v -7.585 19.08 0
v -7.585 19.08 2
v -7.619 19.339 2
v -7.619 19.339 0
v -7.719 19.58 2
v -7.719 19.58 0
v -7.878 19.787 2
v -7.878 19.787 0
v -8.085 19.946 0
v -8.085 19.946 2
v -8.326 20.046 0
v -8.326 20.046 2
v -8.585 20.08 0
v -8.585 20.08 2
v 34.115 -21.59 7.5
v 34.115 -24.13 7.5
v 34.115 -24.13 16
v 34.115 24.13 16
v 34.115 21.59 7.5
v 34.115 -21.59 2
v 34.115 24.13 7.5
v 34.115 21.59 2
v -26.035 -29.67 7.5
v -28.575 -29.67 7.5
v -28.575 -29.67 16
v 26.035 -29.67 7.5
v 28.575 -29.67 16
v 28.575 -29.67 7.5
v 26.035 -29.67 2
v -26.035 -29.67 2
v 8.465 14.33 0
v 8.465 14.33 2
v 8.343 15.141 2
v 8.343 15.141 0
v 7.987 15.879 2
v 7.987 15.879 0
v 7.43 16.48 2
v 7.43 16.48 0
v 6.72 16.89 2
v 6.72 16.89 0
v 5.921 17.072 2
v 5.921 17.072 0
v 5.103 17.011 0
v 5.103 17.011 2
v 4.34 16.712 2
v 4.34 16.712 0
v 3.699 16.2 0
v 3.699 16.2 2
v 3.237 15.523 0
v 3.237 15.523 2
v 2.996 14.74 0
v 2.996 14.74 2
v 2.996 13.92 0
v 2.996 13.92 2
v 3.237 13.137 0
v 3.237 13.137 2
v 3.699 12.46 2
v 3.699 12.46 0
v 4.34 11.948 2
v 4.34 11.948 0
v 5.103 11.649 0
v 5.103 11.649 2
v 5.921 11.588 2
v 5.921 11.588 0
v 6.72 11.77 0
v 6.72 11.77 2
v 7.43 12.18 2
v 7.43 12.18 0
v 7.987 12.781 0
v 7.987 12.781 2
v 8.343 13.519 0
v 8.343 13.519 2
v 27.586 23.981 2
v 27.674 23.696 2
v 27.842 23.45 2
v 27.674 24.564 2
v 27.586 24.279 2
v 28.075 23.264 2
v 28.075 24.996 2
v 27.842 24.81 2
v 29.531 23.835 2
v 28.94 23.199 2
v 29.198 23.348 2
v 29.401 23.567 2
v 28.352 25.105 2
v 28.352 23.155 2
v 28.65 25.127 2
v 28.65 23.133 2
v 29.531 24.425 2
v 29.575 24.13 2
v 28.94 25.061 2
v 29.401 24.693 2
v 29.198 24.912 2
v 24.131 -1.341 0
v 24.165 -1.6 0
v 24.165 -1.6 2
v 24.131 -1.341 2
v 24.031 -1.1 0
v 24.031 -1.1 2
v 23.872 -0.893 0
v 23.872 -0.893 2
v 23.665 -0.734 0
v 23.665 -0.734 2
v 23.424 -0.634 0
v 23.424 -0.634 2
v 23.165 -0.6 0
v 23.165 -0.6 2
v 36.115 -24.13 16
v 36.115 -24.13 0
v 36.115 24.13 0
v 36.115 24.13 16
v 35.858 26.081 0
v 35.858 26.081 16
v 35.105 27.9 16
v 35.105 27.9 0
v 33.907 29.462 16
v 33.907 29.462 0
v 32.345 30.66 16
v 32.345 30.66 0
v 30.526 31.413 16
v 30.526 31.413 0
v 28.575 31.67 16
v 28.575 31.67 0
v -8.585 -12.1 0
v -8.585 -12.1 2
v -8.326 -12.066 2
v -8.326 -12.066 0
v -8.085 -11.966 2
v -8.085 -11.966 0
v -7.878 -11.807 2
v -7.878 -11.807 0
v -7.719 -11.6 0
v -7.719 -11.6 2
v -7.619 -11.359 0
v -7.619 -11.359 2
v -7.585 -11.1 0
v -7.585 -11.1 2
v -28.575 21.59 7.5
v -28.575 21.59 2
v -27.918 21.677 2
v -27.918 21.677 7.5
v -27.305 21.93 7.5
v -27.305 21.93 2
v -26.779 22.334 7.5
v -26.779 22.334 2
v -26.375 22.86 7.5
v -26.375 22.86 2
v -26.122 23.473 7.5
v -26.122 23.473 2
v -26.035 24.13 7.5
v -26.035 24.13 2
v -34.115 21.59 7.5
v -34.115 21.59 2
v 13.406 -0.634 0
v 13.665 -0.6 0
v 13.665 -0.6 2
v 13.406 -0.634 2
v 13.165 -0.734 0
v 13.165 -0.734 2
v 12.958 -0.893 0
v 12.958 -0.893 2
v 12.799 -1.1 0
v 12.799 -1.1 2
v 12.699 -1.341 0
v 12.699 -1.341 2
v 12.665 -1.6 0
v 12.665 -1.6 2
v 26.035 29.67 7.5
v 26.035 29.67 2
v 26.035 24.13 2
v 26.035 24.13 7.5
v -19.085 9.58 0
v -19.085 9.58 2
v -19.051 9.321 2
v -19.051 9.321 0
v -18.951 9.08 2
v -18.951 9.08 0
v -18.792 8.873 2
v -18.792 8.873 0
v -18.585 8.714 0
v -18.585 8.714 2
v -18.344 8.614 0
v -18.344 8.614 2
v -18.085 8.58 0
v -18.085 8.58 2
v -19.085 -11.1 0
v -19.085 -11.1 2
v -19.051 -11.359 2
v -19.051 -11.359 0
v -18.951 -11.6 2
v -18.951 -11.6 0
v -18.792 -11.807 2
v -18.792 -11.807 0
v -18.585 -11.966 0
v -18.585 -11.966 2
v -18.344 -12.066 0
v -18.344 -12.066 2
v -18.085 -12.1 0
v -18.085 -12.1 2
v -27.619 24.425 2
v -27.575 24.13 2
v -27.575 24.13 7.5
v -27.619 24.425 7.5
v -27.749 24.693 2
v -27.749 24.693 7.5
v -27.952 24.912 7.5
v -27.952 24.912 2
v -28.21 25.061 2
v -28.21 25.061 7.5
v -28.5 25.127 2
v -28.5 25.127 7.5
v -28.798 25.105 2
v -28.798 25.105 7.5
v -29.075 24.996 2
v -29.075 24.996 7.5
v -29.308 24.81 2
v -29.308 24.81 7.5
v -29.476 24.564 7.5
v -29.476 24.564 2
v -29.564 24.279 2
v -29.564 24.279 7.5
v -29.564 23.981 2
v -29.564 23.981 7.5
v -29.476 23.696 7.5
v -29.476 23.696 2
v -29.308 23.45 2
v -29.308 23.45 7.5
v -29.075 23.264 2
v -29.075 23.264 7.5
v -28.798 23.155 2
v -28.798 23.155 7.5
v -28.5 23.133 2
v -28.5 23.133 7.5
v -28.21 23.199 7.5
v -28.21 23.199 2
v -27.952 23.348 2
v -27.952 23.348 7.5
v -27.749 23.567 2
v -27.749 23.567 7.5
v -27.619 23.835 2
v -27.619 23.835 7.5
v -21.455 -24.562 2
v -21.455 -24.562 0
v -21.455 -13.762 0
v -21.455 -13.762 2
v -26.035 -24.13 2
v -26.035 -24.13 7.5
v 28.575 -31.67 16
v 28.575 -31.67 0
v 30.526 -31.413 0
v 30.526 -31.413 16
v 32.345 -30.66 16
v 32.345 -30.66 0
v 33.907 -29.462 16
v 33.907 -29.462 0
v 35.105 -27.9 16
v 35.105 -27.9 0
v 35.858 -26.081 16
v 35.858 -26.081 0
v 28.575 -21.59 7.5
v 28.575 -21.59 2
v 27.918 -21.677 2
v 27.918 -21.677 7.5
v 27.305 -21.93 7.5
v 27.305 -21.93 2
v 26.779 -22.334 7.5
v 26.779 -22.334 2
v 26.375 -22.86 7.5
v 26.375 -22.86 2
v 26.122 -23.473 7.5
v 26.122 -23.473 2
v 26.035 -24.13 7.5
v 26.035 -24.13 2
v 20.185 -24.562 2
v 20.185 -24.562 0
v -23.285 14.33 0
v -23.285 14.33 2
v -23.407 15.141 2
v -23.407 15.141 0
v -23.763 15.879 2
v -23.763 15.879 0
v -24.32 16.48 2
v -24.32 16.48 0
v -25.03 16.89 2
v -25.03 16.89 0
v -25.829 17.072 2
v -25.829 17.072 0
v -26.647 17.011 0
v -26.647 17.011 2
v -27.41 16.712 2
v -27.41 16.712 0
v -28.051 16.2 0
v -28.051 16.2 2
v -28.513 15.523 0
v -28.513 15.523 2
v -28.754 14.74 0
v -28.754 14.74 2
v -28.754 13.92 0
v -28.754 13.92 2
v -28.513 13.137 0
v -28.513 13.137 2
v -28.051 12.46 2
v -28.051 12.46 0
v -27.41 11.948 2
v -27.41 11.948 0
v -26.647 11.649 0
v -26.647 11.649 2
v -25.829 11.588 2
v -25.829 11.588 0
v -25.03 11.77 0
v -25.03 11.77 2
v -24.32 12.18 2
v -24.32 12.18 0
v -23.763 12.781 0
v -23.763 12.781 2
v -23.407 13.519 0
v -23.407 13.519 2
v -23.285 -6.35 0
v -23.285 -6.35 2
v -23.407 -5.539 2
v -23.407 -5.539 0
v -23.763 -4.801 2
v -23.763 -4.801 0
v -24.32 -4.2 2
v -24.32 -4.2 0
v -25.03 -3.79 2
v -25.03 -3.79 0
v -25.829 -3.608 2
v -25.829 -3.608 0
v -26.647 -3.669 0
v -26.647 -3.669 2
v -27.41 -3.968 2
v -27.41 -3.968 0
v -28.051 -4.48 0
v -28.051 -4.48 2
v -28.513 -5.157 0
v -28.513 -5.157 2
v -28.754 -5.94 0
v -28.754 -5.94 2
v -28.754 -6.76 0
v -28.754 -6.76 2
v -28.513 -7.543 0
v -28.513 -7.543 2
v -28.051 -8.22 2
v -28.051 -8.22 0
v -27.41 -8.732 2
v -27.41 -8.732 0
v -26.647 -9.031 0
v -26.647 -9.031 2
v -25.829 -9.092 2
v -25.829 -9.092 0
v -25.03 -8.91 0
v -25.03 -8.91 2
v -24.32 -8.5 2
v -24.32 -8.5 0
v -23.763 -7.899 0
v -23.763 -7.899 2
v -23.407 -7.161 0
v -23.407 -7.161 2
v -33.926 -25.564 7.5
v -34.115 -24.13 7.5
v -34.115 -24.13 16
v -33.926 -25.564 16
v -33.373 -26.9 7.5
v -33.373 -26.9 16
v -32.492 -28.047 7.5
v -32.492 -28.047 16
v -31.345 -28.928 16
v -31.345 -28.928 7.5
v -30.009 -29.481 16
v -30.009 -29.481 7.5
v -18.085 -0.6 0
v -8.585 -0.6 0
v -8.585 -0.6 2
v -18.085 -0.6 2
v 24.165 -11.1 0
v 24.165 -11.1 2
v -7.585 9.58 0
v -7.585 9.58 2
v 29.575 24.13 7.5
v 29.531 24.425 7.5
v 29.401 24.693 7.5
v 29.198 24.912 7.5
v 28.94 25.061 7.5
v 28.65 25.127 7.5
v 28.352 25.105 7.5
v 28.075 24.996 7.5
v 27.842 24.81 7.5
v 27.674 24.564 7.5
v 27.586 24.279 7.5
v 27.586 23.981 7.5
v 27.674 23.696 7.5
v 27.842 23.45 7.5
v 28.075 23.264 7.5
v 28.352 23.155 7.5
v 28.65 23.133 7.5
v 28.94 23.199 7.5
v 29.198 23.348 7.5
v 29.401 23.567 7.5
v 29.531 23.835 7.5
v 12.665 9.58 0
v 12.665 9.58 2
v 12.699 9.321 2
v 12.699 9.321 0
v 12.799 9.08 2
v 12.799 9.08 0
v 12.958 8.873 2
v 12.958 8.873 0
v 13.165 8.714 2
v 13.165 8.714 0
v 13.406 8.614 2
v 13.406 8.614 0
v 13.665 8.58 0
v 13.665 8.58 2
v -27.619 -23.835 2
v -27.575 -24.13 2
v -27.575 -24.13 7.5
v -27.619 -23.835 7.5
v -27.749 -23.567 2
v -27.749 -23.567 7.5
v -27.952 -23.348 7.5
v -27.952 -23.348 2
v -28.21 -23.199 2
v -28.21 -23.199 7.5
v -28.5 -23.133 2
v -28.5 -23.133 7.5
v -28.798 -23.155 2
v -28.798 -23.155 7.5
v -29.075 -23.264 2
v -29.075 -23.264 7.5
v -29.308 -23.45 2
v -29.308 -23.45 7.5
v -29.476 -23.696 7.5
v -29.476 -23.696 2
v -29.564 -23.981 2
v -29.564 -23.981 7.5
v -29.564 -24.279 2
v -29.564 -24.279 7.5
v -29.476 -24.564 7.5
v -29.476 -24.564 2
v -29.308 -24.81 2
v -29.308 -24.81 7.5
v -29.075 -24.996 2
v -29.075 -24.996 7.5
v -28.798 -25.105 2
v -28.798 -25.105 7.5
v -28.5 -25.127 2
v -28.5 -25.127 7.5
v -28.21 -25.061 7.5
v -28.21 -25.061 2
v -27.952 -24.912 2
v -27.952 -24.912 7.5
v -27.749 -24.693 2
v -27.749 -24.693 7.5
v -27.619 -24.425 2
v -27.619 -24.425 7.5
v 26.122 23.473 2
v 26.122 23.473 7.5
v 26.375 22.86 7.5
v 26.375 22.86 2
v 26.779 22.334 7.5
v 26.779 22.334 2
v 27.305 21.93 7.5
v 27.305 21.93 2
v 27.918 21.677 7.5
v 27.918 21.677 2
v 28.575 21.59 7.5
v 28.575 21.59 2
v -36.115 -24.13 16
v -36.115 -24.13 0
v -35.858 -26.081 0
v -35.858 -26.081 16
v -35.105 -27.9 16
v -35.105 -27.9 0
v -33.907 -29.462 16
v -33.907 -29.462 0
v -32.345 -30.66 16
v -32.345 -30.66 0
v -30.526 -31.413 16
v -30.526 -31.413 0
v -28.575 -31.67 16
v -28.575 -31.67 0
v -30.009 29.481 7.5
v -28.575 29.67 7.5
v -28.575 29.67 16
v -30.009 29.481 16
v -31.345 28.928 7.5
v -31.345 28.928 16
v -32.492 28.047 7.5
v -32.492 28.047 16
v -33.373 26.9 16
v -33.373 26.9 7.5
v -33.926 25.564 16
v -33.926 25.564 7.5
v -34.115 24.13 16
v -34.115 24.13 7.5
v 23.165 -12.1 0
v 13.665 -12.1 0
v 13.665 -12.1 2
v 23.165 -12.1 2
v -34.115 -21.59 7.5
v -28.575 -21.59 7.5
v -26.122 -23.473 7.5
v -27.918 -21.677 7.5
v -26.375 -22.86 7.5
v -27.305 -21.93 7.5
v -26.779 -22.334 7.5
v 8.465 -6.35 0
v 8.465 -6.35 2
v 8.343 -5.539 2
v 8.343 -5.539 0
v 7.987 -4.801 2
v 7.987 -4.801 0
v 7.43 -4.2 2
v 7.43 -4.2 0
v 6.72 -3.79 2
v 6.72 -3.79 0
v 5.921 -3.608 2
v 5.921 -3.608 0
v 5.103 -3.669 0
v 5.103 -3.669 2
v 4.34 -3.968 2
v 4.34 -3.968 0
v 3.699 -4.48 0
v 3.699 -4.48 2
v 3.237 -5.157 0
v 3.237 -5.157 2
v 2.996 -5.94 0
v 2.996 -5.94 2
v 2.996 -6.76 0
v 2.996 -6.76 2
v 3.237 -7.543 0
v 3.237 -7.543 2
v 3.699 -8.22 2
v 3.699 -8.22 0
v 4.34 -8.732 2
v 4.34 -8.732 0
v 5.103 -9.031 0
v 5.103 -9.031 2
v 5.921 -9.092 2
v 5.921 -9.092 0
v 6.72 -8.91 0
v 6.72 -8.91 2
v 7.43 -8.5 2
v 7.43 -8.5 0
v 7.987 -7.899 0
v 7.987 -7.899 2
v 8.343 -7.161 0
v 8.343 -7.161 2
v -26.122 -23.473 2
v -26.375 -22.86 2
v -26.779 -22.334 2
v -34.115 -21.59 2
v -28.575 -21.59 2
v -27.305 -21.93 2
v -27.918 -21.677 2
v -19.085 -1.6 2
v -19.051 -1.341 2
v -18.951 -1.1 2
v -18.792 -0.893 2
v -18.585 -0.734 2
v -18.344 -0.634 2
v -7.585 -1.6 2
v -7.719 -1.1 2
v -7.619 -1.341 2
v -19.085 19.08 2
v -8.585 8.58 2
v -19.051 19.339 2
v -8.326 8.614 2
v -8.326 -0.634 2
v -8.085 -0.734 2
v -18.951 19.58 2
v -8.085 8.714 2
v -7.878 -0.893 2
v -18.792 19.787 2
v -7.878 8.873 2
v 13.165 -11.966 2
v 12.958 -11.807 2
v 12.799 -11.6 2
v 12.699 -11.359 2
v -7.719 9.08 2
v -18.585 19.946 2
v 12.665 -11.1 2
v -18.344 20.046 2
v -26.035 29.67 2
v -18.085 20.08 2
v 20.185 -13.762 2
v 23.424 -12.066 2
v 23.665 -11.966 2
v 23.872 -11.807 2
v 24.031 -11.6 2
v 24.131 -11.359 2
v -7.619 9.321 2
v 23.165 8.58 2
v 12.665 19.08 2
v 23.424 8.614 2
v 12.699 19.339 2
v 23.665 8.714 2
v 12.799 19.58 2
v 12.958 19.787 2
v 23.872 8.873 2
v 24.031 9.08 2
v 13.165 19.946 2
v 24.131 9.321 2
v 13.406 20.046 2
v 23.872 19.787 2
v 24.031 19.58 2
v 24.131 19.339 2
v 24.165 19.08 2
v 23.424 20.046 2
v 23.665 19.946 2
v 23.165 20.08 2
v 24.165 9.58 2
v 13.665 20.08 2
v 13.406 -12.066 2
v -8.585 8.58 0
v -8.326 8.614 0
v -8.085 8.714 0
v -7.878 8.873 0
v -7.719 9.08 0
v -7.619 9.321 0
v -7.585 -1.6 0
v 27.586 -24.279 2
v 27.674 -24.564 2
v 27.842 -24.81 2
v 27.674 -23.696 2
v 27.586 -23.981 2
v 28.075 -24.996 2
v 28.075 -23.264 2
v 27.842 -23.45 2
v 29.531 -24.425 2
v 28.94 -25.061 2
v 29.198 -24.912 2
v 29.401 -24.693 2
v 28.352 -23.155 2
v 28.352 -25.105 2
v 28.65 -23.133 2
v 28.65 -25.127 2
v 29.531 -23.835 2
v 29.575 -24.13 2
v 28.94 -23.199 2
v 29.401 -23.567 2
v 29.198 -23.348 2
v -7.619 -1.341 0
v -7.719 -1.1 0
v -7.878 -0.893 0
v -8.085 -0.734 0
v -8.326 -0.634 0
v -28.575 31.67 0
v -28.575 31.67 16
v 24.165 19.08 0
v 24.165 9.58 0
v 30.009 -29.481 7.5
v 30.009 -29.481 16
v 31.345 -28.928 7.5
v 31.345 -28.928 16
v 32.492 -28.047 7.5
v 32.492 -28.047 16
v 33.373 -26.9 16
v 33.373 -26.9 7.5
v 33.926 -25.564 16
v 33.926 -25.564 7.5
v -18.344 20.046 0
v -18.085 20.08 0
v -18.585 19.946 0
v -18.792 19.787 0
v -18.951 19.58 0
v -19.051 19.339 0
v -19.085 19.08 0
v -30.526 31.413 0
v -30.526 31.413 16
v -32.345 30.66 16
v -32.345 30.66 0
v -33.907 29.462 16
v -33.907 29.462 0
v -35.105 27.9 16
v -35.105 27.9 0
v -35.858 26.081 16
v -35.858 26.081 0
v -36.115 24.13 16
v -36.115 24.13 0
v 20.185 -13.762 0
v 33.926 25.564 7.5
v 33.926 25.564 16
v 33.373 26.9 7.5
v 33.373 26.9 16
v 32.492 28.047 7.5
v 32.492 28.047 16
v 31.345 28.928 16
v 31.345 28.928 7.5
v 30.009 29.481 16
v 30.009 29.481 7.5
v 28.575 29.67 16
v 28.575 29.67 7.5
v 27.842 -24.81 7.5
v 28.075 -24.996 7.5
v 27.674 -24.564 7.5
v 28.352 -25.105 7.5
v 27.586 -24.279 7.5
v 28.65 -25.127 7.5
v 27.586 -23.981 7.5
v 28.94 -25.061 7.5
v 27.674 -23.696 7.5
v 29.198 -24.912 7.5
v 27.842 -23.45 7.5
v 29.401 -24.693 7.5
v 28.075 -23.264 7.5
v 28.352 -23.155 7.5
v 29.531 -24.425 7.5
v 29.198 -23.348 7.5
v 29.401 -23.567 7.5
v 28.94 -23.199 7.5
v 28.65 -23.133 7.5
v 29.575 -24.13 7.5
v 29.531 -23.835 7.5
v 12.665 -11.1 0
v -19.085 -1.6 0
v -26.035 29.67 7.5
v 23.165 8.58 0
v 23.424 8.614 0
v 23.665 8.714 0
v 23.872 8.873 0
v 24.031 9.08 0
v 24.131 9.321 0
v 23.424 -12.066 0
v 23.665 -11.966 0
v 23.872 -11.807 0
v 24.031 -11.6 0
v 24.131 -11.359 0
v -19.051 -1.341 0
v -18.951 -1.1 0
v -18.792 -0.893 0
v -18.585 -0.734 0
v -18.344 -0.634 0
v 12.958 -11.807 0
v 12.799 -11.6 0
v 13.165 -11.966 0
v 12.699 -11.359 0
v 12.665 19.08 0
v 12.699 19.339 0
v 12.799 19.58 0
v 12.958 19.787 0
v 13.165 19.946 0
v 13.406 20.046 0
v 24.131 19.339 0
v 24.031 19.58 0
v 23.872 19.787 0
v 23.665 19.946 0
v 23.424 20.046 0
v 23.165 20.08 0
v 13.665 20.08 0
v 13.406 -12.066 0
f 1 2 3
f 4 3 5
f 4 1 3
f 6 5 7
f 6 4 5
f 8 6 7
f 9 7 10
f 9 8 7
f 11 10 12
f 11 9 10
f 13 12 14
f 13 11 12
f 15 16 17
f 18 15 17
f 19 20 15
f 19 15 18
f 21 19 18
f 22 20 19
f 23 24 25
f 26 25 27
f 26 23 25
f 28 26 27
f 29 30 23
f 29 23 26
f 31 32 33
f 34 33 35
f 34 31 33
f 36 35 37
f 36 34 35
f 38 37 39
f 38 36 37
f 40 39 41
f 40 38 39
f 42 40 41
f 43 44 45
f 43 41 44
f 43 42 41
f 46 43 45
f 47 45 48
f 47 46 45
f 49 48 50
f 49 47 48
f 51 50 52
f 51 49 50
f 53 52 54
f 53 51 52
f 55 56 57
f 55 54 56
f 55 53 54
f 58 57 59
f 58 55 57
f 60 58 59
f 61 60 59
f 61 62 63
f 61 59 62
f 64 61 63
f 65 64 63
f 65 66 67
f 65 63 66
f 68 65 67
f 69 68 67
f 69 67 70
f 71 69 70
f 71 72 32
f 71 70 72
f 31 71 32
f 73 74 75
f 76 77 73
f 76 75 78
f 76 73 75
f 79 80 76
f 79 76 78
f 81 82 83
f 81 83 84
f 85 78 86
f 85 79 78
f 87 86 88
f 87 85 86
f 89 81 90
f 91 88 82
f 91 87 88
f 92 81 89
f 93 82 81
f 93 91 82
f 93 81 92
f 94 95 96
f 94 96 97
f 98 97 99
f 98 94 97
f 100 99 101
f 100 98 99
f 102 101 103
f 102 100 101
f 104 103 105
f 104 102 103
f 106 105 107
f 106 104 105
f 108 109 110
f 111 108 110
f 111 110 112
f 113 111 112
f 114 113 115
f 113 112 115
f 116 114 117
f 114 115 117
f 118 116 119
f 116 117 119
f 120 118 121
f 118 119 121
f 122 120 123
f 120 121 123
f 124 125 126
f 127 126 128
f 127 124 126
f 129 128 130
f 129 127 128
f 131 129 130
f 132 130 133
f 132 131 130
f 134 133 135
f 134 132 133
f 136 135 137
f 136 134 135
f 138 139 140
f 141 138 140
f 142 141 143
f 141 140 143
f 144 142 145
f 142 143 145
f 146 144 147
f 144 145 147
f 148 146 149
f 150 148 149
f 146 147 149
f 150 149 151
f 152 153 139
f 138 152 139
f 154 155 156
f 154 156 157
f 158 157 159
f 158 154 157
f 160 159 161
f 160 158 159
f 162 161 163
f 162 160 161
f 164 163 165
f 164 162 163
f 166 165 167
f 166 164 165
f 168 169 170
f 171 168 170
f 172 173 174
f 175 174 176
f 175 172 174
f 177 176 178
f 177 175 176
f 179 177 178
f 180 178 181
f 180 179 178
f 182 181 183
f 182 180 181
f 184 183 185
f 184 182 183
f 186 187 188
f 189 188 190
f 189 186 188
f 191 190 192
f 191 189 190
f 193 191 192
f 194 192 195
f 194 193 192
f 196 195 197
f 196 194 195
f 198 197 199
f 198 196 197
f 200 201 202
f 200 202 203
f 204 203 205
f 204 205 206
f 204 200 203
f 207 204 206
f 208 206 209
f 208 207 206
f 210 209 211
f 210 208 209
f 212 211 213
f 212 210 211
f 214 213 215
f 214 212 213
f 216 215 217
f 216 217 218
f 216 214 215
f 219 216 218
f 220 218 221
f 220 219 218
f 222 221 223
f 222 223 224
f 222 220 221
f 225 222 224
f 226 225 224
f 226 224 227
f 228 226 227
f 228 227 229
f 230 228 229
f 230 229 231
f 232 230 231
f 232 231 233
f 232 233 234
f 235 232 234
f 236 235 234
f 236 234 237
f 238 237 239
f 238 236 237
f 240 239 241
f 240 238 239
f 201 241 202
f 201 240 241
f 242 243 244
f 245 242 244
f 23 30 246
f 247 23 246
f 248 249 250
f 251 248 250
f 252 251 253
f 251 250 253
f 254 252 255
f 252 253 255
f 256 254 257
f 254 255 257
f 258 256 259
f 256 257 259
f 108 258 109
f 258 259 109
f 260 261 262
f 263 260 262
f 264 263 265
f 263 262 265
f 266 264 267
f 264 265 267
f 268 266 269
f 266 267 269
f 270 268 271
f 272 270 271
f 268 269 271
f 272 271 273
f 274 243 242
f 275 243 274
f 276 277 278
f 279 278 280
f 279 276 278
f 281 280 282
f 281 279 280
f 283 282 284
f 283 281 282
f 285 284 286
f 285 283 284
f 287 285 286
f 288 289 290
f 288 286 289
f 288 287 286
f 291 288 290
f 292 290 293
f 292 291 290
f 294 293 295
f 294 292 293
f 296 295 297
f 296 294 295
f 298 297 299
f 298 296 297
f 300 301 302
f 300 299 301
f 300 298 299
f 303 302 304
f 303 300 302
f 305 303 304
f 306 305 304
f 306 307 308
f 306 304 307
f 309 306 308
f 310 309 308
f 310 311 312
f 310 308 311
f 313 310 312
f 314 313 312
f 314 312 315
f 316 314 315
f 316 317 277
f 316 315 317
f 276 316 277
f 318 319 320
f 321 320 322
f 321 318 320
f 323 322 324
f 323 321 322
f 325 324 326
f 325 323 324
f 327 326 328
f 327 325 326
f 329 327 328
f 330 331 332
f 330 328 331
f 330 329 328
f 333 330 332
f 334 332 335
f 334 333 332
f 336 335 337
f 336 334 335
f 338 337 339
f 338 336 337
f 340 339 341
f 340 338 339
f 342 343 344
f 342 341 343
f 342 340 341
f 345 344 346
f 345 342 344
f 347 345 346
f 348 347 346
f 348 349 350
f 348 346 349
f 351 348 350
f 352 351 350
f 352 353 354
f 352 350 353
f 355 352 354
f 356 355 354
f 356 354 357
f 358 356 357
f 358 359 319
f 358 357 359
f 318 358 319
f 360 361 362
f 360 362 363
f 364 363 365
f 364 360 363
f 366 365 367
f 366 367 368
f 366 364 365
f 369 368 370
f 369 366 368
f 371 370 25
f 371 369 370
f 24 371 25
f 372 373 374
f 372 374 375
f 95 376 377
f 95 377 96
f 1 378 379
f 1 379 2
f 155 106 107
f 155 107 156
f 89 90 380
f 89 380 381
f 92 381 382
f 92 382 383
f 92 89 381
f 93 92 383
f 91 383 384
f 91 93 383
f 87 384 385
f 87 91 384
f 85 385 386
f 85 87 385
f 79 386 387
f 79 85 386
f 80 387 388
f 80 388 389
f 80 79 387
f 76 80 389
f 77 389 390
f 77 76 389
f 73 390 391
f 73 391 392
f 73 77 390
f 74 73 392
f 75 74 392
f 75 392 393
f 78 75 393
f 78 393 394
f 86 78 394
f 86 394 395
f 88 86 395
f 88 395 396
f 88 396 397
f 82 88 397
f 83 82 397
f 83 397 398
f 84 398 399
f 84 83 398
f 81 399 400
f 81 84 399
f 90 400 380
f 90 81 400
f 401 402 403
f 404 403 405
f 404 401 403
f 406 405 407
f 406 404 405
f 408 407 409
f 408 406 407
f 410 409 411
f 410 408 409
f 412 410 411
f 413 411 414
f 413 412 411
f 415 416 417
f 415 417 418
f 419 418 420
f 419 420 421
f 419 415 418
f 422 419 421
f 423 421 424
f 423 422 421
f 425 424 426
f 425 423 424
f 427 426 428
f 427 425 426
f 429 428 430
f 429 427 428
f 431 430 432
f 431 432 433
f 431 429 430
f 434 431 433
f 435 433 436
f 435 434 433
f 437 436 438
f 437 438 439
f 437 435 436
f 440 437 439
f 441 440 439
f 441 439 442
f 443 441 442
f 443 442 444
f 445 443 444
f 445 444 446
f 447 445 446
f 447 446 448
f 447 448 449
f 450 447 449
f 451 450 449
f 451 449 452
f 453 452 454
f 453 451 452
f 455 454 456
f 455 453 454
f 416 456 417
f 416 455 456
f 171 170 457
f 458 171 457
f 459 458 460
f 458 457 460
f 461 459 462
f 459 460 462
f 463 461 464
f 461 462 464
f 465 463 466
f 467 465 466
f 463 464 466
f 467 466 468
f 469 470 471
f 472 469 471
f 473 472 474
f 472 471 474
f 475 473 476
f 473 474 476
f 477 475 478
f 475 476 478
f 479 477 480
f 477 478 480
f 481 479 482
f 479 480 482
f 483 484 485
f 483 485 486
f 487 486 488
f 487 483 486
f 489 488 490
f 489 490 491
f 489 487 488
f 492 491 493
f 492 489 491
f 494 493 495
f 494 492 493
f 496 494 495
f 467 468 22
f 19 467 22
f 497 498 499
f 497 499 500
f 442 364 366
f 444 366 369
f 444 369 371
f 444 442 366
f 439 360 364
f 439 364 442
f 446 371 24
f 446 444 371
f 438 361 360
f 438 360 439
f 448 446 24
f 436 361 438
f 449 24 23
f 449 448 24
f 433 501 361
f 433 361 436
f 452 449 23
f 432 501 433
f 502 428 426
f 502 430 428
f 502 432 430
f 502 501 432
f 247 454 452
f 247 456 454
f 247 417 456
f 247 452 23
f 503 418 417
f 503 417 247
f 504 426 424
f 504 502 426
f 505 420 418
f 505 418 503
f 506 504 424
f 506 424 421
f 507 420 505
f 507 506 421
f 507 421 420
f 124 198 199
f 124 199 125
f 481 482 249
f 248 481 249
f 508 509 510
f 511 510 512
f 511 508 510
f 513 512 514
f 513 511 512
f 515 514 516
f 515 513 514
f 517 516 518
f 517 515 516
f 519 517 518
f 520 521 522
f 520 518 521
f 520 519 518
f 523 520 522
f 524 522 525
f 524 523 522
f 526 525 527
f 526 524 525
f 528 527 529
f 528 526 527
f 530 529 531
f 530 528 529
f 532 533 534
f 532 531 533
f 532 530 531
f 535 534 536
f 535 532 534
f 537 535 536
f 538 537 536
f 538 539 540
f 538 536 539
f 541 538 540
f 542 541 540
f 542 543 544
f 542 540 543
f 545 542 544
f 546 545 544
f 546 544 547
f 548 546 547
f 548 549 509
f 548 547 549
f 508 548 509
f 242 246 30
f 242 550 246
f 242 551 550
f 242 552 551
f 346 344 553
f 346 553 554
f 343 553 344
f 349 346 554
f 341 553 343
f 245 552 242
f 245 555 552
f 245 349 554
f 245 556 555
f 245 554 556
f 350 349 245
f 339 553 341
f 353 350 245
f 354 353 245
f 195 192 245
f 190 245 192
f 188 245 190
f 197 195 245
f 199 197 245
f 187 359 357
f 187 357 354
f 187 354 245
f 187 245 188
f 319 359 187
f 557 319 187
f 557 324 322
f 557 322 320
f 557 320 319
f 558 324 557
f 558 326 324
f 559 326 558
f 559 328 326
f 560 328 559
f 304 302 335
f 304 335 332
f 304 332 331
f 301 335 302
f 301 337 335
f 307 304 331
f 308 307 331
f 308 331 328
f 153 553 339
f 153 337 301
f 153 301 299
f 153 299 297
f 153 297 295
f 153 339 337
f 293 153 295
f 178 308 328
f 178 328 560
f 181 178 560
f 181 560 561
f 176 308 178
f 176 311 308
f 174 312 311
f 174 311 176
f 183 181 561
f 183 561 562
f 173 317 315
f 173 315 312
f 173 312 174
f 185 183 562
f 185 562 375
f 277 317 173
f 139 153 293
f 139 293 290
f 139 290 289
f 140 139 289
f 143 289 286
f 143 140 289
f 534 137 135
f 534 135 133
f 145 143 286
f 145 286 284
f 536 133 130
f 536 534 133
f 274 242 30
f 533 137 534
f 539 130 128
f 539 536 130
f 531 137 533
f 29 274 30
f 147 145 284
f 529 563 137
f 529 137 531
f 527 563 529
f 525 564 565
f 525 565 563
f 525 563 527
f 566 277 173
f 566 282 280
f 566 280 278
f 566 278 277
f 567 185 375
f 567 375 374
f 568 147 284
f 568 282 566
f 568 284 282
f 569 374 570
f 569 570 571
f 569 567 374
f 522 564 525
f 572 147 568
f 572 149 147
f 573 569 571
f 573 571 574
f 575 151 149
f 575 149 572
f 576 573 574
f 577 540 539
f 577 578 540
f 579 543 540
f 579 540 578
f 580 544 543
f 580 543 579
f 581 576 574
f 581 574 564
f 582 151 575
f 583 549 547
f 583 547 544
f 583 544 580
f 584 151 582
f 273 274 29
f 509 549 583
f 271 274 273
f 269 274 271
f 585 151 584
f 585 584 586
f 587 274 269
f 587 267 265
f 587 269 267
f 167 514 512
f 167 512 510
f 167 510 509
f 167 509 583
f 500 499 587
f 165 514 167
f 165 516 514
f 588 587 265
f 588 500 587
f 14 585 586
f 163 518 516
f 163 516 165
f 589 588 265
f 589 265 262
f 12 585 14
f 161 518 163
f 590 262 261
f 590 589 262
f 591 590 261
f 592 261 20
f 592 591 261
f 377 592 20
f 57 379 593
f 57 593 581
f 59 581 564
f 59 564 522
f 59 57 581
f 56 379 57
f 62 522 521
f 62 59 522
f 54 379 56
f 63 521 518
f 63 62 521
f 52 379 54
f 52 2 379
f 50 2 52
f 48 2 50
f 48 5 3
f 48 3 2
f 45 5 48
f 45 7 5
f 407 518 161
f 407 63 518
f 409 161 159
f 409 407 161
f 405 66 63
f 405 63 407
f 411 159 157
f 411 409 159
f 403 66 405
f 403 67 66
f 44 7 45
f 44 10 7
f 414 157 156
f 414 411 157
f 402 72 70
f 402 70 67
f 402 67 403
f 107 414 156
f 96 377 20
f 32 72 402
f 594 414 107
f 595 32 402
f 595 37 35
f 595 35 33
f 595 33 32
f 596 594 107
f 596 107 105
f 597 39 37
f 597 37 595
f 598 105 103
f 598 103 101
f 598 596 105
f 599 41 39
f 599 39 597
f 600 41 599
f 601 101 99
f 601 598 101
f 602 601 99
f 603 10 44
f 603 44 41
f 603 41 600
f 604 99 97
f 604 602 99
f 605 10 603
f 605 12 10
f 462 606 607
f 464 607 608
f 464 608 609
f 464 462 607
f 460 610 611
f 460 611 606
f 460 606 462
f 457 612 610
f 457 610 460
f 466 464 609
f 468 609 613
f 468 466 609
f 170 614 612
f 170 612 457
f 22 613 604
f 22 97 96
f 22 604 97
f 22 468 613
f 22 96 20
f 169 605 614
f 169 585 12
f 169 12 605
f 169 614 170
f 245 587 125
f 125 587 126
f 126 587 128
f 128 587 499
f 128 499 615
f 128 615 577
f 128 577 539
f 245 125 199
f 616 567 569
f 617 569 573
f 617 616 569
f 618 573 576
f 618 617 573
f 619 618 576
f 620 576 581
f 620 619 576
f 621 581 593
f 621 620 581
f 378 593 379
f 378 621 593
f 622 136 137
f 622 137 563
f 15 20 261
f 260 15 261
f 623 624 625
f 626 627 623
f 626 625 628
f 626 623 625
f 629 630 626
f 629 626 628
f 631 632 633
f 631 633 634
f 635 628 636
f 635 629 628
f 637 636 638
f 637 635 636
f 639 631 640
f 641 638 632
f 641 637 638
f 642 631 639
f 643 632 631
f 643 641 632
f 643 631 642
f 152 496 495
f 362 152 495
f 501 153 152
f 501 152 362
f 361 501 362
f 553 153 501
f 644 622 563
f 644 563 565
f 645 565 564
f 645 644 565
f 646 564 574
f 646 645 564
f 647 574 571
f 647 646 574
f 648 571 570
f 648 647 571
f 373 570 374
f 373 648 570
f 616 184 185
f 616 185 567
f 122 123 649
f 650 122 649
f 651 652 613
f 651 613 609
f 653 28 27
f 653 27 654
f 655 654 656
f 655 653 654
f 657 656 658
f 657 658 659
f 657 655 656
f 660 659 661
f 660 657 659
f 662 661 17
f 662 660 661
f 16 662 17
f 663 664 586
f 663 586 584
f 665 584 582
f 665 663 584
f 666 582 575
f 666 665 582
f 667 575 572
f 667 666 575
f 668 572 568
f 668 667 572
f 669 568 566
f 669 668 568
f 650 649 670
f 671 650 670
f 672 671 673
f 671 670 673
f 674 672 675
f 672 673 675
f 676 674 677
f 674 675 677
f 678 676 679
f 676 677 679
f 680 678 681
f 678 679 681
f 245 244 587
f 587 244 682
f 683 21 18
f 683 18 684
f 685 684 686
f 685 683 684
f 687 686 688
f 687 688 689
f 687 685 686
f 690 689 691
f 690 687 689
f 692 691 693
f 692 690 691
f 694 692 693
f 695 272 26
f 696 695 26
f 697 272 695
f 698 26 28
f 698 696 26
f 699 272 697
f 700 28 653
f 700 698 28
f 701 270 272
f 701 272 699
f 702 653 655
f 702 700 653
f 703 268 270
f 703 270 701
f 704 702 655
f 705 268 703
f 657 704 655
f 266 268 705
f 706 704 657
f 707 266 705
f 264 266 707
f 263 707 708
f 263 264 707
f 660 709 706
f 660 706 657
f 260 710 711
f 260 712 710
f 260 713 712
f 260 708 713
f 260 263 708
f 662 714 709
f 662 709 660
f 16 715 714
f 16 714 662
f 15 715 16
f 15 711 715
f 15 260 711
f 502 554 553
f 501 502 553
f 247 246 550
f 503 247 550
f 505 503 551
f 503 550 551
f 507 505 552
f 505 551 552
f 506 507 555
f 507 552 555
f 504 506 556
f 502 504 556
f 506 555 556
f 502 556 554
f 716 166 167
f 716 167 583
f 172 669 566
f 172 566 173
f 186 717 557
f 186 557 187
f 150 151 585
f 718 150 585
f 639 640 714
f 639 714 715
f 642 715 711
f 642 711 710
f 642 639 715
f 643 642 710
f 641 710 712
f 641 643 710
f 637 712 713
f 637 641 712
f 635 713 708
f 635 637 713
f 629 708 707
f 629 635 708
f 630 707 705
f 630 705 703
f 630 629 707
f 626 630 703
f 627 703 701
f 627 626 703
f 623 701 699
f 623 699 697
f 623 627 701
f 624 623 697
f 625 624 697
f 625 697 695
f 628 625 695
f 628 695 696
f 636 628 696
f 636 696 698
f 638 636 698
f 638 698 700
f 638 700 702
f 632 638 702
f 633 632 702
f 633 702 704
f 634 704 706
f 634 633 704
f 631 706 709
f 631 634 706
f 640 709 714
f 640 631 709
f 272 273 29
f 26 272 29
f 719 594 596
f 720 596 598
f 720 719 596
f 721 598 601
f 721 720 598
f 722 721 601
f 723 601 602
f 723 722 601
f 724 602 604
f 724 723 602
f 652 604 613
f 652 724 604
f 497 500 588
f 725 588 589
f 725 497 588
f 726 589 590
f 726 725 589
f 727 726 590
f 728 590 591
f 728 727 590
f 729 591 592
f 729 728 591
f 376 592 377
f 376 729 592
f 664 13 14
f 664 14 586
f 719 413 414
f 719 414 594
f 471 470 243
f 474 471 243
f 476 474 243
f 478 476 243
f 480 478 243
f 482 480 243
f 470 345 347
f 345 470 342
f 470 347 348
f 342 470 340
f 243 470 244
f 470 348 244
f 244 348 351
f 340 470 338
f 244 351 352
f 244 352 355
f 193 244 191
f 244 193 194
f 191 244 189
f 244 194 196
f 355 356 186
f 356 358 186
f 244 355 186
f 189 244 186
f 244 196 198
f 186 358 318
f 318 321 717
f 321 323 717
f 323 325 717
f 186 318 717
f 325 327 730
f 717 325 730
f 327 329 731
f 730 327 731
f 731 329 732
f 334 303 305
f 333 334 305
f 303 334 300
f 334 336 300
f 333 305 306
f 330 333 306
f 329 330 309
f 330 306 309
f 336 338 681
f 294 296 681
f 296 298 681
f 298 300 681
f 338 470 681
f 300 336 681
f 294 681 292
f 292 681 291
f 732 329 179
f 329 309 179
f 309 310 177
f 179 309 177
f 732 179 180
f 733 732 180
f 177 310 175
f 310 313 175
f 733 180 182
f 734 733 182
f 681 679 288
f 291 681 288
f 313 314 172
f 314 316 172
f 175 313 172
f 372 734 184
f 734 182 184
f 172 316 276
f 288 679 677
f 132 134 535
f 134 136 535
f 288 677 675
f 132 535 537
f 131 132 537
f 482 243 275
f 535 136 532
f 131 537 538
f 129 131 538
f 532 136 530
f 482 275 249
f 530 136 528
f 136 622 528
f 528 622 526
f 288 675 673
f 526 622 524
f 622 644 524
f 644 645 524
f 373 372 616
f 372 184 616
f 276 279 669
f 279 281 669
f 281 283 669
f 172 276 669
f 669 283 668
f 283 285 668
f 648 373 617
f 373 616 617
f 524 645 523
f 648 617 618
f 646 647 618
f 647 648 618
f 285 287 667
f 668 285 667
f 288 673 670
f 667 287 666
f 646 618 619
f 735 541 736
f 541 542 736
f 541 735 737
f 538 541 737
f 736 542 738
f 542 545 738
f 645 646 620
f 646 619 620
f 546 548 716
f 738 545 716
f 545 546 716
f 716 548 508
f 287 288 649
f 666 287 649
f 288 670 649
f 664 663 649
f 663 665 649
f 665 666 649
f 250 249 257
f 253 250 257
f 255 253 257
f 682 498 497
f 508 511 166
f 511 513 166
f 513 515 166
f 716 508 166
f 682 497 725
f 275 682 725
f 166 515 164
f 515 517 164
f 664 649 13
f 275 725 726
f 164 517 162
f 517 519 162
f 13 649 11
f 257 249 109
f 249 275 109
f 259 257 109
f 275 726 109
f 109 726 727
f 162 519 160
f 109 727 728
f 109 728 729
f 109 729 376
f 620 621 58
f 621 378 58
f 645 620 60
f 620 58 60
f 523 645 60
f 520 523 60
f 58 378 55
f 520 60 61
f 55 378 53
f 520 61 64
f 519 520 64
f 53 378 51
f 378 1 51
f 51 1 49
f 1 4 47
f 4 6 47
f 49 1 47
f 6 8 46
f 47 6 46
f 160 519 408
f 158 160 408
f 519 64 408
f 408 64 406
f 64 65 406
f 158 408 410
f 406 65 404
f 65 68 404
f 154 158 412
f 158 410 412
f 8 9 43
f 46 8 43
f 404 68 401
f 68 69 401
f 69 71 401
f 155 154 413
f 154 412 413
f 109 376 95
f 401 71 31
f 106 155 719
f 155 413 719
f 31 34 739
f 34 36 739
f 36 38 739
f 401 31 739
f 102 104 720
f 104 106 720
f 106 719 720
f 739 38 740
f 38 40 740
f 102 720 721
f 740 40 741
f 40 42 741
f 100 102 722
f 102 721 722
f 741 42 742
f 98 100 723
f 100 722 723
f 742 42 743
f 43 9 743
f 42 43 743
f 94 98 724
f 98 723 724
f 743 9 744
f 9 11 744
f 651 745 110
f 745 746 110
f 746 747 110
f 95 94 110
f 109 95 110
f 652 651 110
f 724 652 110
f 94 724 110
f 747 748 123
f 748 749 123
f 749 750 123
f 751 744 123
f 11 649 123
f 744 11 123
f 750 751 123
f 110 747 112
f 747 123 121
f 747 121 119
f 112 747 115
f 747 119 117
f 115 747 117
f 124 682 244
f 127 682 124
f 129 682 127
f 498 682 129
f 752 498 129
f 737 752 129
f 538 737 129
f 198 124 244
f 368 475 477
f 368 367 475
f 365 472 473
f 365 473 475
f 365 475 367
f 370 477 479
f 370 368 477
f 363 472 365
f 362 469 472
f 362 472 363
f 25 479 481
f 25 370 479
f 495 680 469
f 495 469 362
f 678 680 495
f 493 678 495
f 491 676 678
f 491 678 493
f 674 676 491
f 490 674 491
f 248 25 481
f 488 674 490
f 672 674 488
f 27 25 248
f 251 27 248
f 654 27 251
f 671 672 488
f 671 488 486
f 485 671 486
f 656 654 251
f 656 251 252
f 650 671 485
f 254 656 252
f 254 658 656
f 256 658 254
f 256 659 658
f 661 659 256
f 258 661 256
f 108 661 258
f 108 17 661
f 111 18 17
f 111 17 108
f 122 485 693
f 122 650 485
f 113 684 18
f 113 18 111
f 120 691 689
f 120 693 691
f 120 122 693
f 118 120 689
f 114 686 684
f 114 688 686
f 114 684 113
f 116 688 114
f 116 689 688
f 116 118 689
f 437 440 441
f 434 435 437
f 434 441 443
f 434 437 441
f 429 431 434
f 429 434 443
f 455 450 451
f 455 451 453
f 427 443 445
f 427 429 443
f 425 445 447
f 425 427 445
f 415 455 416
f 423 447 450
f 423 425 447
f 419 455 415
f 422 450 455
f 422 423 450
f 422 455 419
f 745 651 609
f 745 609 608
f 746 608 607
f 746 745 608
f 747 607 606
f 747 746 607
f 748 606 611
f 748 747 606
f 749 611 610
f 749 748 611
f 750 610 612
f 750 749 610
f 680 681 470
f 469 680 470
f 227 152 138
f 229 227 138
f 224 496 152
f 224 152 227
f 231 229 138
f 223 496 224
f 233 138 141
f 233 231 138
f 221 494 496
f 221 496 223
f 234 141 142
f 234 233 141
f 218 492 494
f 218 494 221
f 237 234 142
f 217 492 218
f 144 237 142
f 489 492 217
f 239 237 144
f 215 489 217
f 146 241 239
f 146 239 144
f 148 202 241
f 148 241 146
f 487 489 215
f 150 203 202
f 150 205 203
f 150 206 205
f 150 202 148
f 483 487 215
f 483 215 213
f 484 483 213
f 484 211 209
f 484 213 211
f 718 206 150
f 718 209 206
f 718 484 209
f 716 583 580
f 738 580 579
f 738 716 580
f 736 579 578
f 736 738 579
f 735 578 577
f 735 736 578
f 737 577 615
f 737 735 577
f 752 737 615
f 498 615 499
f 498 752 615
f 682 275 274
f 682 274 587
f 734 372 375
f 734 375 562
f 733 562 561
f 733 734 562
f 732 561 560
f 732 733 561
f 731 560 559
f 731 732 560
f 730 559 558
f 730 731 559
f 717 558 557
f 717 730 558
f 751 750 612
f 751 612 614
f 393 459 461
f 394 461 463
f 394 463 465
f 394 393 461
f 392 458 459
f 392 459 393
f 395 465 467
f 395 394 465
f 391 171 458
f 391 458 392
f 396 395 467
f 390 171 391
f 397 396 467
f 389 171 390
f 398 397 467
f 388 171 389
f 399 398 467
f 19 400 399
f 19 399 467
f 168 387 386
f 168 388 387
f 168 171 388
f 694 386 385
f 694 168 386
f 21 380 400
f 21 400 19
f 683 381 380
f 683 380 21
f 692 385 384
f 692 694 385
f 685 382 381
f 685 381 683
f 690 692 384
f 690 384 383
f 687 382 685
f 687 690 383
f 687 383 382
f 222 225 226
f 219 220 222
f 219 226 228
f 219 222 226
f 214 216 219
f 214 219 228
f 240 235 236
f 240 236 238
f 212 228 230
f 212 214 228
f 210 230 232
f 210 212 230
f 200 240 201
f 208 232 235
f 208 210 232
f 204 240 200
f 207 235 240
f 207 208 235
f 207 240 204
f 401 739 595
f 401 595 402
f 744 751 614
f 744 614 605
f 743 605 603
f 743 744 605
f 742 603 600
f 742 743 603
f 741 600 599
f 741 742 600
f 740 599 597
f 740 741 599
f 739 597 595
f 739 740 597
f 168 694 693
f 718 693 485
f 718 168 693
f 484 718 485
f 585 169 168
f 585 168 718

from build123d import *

# Parameters (mm, degrees)
F1_DEPTH = 16
F2_T     = -2
F3_W     = 41.64
F3_H     = 10.8
F3_R     = 2.75
F4_DEPTH = 16.001
F5_R     = 1
F6_DEPTH = 5.5


with BuildPart() as f1:
    # F0 (on Top) → F1 (new body)
    with BuildSketch(Plane.XY):
        with BuildLine():
            ThreePointArc((36.115, 24.13), (33.906585, 29.461585), (28.575, 31.67))
            Line((28.575, 31.67), (-28.575, 31.67))
            ThreePointArc((-28.575, 31.67), (-33.906585, 29.461585), (-36.115, 24.13))
            Line((-36.115, 24.13), (-36.115, -24.13))
            ThreePointArc((-36.115, -24.13), (-33.906585, -29.461585), (-28.575, -31.67))
            Line((-28.575, -31.67), (28.575, -31.67))
            ThreePointArc((28.575, -31.67), (33.906585, -29.461585), (36.115, -24.13))
            Line((36.115, -24.13), (36.115, 24.13))
        make_face()
    extrude(amount=F1_DEPTH)

    # F2
    f2_openings = [f1.faces().sort_by_distance(p)[0] for p in [
        (0, 0, 16),
    ]]
    offset(amount=F2_T, openings=f2_openings)

    # F3 (on Top) → F4 (cut, through all)
    with BuildSketch(Plane.XY):
        with Locations((-0.635, -19.162)):
            Rectangle(F3_W, F3_H)
        with BuildLine():
            Line((-8.585, -0.6), (-18.085, -0.6))
            ThreePointArc((-18.085, -0.6), (-18.792107, -0.892893), (-19.085, -1.6))
            Line((-19.085, -1.6), (-19.085, -11.1))
            ThreePointArc((-19.085, -11.1), (-18.792107, -11.807107), (-18.085, -12.1))
            Line((-18.085, -12.1), (-8.585, -12.1))
            ThreePointArc((-8.585, -12.1), (-7.877893, -11.807107), (-7.585, -11.1))
            Line((-7.585, -11.1), (-7.585, -1.6))
            ThreePointArc((-7.585, -1.6), (-7.877893, -0.892893), (-8.585, -0.6))
        make_face()
        with Locations((-26.035, -6.35)):
            Circle(F3_R)
        with BuildLine():
            Line((-8.585, 20.08), (-18.085, 20.08))
            ThreePointArc((-18.085, 20.08), (-18.792107, 19.787107), (-19.085, 19.08))
            Line((-19.085, 19.08), (-19.085, 9.58))
            ThreePointArc((-19.085, 9.58), (-18.792107, 8.872893), (-18.085, 8.58))
            Line((-18.085, 8.58), (-8.585, 8.58))
            ThreePointArc((-8.585, 8.58), (-7.877893, 8.872893), (-7.585, 9.58))
            Line((-7.585, 9.58), (-7.585, 19.08))
            ThreePointArc((-7.585, 19.08), (-7.877893, 19.787107), (-8.585, 20.08))
        make_face()
        with Locations((-26.035, 14.33)):
            Circle(F3_R)
        with BuildLine():
            Line((23.165, -0.6), (13.665, -0.6))
            ThreePointArc((13.665, -0.6), (12.957893, -0.892893), (12.665, -1.6))
            Line((12.665, -1.6), (12.665, -11.1))
            ThreePointArc((12.665, -11.1), (12.957893, -11.807107), (13.665, -12.1))
            Line((13.665, -12.1), (23.165, -12.1))
            ThreePointArc((23.165, -12.1), (23.872107, -11.807107), (24.165, -11.1))
            Line((24.165, -11.1), (24.165, -1.6))
            ThreePointArc((24.165, -1.6), (23.872107, -0.892893), (23.165, -0.6))
        make_face()
        with Locations((5.715, -6.35)):
            Circle(F3_R)
        with BuildLine():
            Line((23.165, 20.08), (13.665, 20.08))
            ThreePointArc((13.665, 20.08), (12.957893, 19.787107), (12.665, 19.08))
            Line((12.665, 19.08), (12.665, 9.58))
            ThreePointArc((12.665, 9.58), (12.957893, 8.872893), (13.665, 8.58))
            Line((13.665, 8.58), (23.165, 8.58))
            ThreePointArc((23.165, 8.58), (23.872107, 8.872893), (24.165, 9.58))
            Line((24.165, 9.58), (24.165, 19.08))
            ThreePointArc((24.165, 19.08), (23.872107, 19.787107), (23.165, 20.08))
        make_face()
        with Locations((5.715, 14.33)):
            Circle(F3_R)
    extrude(amount=F4_DEPTH, mode=Mode.SUBTRACT)

    # F5 (on face) → F6 (join)
    with BuildSketch(Plane.XY.offset(2)):
        with BuildLine():
            Line((-34.115, 24.13), (-34.115, 21.59))
            Line((-34.115, 21.59), (-28.575, 21.59))
            ThreePointArc((-28.575, 21.59), (-26.778949, 22.333949), (-26.035, 24.13))
            Line((-26.035, 24.13), (-26.035, 29.67))
            Line((-26.035, 29.67), (-28.575, 29.67))
            ThreePointArc((-28.575, 29.67), (-32.492372, 28.047372), (-34.115, 24.13))
        make_face()
        with Locations((-28.575, 24.13)):
            Circle(F5_R, mode=Mode.SUBTRACT)
        with BuildLine():
            Line((28.575, 21.59), (34.115, 21.59))
            Line((34.115, 21.59), (34.115, 24.13))
            ThreePointArc((34.115, 24.13), (32.492372, 28.047372), (28.575, 29.67))
            Line((28.575, 29.67), (26.035, 29.67))
            Line((26.035, 29.67), (26.035, 24.13))
            ThreePointArc((26.035, 24.13), (26.778949, 22.333949), (28.575, 21.59))
        make_face()
        with Locations((28.575, 24.13)):
            Circle(F5_R, mode=Mode.SUBTRACT)
        with BuildLine():
            Line((26.035, -24.13), (26.035, -29.67))
            Line((26.035, -29.67), (28.575, -29.67))
            ThreePointArc((28.575, -29.67), (32.492372, -28.047372), (34.115, -24.13))
            Line((34.115, -24.13), (34.115, -21.59))
            Line((34.115, -21.59), (28.575, -21.59))
            ThreePointArc((28.575, -21.59), (26.778949, -22.333949), (26.035, -24.13))
        make_face()
        with Locations((28.575, -24.13)):
            Circle(F5_R, mode=Mode.SUBTRACT)
        with BuildLine():
            Line((-34.115, -21.59), (-34.115, -24.13))
            ThreePointArc((-34.115, -24.13), (-32.492372, -28.047372), (-28.575, -29.67))
            Line((-28.575, -29.67), (-26.035, -29.67))
            Line((-26.035, -29.67), (-26.035, -24.13))
            ThreePointArc((-26.035, -24.13), (-26.778949, -22.333949), (-28.575, -21.59))
            Line((-28.575, -21.59), (-34.115, -21.59))
        make_face()
        with Locations((-28.575, -24.13)):
            Circle(F5_R, mode=Mode.SUBTRACT)
    extrude(amount=F6_DEPTH)


solid = f1.part
